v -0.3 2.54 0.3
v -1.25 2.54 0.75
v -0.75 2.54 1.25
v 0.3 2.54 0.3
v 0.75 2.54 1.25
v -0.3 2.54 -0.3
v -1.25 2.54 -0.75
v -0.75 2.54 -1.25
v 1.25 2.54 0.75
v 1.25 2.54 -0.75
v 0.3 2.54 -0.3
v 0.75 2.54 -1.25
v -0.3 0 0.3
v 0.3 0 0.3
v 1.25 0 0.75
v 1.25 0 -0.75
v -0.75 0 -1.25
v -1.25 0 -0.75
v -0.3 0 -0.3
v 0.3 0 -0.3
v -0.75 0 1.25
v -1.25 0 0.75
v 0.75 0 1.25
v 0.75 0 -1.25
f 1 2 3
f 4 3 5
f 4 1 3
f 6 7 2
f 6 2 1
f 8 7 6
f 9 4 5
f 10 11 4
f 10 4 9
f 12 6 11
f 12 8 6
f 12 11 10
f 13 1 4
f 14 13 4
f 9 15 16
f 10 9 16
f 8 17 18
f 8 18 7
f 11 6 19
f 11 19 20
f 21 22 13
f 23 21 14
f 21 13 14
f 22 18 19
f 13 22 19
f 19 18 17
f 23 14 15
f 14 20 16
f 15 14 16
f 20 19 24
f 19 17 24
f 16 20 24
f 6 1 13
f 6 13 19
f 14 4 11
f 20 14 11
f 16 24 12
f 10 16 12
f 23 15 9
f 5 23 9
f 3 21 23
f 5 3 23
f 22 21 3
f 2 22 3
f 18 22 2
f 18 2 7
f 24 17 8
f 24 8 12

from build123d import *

# Parameters (mm, degrees)
SKETCH_1_W          = 2.5
SKETCH_1_H          = 2.5
EXTRUDE_1_DEPTH     = 2.54
CHAMFER_1_SIZE      = 0.5
SKETCH_2_W          = 0.6
SKETCH_2_H          = 0.6
CUT_EXTRUDE_1_DEPTH = 4.094608214


with BuildPart() as part:
    # 스케치1 → 보스-돌출1 (new body)
    with BuildSketch(Plane(origin=(0, 0, 0), x_dir=(1, 0, 0), z_dir=(0, 1, 0))):
        Rectangle(SKETCH_1_W, SKETCH_1_H)
    extrude(amount=EXTRUDE_1_DEPTH)

    # 모따기1
    chamfer_1_edges = [part.edges().sort_by_distance(p)[0] for p in [
        (1.25, 1.27, 1.25),
        (-1.25, 1.27, 1.25),
        (-1.25, 1.27, -1.25),
        (1.25, 1.27, -1.25),
    ]]
    chamfer(chamfer_1_edges, length=CHAMFER_1_SIZE)

    # 스케치2 → 컷-돌출1 (cut, through all)
    with BuildSketch(Plane(origin=(0, 2.54, 0), x_dir=(1, 0, 0), z_dir=(0, 1, 0))):
        Rectangle(SKETCH_2_W, SKETCH_2_H)
    extrude(amount=-CUT_EXTRUDE_1_DEPTH, mode=Mode.SUBTRACT)


solid = part.part
